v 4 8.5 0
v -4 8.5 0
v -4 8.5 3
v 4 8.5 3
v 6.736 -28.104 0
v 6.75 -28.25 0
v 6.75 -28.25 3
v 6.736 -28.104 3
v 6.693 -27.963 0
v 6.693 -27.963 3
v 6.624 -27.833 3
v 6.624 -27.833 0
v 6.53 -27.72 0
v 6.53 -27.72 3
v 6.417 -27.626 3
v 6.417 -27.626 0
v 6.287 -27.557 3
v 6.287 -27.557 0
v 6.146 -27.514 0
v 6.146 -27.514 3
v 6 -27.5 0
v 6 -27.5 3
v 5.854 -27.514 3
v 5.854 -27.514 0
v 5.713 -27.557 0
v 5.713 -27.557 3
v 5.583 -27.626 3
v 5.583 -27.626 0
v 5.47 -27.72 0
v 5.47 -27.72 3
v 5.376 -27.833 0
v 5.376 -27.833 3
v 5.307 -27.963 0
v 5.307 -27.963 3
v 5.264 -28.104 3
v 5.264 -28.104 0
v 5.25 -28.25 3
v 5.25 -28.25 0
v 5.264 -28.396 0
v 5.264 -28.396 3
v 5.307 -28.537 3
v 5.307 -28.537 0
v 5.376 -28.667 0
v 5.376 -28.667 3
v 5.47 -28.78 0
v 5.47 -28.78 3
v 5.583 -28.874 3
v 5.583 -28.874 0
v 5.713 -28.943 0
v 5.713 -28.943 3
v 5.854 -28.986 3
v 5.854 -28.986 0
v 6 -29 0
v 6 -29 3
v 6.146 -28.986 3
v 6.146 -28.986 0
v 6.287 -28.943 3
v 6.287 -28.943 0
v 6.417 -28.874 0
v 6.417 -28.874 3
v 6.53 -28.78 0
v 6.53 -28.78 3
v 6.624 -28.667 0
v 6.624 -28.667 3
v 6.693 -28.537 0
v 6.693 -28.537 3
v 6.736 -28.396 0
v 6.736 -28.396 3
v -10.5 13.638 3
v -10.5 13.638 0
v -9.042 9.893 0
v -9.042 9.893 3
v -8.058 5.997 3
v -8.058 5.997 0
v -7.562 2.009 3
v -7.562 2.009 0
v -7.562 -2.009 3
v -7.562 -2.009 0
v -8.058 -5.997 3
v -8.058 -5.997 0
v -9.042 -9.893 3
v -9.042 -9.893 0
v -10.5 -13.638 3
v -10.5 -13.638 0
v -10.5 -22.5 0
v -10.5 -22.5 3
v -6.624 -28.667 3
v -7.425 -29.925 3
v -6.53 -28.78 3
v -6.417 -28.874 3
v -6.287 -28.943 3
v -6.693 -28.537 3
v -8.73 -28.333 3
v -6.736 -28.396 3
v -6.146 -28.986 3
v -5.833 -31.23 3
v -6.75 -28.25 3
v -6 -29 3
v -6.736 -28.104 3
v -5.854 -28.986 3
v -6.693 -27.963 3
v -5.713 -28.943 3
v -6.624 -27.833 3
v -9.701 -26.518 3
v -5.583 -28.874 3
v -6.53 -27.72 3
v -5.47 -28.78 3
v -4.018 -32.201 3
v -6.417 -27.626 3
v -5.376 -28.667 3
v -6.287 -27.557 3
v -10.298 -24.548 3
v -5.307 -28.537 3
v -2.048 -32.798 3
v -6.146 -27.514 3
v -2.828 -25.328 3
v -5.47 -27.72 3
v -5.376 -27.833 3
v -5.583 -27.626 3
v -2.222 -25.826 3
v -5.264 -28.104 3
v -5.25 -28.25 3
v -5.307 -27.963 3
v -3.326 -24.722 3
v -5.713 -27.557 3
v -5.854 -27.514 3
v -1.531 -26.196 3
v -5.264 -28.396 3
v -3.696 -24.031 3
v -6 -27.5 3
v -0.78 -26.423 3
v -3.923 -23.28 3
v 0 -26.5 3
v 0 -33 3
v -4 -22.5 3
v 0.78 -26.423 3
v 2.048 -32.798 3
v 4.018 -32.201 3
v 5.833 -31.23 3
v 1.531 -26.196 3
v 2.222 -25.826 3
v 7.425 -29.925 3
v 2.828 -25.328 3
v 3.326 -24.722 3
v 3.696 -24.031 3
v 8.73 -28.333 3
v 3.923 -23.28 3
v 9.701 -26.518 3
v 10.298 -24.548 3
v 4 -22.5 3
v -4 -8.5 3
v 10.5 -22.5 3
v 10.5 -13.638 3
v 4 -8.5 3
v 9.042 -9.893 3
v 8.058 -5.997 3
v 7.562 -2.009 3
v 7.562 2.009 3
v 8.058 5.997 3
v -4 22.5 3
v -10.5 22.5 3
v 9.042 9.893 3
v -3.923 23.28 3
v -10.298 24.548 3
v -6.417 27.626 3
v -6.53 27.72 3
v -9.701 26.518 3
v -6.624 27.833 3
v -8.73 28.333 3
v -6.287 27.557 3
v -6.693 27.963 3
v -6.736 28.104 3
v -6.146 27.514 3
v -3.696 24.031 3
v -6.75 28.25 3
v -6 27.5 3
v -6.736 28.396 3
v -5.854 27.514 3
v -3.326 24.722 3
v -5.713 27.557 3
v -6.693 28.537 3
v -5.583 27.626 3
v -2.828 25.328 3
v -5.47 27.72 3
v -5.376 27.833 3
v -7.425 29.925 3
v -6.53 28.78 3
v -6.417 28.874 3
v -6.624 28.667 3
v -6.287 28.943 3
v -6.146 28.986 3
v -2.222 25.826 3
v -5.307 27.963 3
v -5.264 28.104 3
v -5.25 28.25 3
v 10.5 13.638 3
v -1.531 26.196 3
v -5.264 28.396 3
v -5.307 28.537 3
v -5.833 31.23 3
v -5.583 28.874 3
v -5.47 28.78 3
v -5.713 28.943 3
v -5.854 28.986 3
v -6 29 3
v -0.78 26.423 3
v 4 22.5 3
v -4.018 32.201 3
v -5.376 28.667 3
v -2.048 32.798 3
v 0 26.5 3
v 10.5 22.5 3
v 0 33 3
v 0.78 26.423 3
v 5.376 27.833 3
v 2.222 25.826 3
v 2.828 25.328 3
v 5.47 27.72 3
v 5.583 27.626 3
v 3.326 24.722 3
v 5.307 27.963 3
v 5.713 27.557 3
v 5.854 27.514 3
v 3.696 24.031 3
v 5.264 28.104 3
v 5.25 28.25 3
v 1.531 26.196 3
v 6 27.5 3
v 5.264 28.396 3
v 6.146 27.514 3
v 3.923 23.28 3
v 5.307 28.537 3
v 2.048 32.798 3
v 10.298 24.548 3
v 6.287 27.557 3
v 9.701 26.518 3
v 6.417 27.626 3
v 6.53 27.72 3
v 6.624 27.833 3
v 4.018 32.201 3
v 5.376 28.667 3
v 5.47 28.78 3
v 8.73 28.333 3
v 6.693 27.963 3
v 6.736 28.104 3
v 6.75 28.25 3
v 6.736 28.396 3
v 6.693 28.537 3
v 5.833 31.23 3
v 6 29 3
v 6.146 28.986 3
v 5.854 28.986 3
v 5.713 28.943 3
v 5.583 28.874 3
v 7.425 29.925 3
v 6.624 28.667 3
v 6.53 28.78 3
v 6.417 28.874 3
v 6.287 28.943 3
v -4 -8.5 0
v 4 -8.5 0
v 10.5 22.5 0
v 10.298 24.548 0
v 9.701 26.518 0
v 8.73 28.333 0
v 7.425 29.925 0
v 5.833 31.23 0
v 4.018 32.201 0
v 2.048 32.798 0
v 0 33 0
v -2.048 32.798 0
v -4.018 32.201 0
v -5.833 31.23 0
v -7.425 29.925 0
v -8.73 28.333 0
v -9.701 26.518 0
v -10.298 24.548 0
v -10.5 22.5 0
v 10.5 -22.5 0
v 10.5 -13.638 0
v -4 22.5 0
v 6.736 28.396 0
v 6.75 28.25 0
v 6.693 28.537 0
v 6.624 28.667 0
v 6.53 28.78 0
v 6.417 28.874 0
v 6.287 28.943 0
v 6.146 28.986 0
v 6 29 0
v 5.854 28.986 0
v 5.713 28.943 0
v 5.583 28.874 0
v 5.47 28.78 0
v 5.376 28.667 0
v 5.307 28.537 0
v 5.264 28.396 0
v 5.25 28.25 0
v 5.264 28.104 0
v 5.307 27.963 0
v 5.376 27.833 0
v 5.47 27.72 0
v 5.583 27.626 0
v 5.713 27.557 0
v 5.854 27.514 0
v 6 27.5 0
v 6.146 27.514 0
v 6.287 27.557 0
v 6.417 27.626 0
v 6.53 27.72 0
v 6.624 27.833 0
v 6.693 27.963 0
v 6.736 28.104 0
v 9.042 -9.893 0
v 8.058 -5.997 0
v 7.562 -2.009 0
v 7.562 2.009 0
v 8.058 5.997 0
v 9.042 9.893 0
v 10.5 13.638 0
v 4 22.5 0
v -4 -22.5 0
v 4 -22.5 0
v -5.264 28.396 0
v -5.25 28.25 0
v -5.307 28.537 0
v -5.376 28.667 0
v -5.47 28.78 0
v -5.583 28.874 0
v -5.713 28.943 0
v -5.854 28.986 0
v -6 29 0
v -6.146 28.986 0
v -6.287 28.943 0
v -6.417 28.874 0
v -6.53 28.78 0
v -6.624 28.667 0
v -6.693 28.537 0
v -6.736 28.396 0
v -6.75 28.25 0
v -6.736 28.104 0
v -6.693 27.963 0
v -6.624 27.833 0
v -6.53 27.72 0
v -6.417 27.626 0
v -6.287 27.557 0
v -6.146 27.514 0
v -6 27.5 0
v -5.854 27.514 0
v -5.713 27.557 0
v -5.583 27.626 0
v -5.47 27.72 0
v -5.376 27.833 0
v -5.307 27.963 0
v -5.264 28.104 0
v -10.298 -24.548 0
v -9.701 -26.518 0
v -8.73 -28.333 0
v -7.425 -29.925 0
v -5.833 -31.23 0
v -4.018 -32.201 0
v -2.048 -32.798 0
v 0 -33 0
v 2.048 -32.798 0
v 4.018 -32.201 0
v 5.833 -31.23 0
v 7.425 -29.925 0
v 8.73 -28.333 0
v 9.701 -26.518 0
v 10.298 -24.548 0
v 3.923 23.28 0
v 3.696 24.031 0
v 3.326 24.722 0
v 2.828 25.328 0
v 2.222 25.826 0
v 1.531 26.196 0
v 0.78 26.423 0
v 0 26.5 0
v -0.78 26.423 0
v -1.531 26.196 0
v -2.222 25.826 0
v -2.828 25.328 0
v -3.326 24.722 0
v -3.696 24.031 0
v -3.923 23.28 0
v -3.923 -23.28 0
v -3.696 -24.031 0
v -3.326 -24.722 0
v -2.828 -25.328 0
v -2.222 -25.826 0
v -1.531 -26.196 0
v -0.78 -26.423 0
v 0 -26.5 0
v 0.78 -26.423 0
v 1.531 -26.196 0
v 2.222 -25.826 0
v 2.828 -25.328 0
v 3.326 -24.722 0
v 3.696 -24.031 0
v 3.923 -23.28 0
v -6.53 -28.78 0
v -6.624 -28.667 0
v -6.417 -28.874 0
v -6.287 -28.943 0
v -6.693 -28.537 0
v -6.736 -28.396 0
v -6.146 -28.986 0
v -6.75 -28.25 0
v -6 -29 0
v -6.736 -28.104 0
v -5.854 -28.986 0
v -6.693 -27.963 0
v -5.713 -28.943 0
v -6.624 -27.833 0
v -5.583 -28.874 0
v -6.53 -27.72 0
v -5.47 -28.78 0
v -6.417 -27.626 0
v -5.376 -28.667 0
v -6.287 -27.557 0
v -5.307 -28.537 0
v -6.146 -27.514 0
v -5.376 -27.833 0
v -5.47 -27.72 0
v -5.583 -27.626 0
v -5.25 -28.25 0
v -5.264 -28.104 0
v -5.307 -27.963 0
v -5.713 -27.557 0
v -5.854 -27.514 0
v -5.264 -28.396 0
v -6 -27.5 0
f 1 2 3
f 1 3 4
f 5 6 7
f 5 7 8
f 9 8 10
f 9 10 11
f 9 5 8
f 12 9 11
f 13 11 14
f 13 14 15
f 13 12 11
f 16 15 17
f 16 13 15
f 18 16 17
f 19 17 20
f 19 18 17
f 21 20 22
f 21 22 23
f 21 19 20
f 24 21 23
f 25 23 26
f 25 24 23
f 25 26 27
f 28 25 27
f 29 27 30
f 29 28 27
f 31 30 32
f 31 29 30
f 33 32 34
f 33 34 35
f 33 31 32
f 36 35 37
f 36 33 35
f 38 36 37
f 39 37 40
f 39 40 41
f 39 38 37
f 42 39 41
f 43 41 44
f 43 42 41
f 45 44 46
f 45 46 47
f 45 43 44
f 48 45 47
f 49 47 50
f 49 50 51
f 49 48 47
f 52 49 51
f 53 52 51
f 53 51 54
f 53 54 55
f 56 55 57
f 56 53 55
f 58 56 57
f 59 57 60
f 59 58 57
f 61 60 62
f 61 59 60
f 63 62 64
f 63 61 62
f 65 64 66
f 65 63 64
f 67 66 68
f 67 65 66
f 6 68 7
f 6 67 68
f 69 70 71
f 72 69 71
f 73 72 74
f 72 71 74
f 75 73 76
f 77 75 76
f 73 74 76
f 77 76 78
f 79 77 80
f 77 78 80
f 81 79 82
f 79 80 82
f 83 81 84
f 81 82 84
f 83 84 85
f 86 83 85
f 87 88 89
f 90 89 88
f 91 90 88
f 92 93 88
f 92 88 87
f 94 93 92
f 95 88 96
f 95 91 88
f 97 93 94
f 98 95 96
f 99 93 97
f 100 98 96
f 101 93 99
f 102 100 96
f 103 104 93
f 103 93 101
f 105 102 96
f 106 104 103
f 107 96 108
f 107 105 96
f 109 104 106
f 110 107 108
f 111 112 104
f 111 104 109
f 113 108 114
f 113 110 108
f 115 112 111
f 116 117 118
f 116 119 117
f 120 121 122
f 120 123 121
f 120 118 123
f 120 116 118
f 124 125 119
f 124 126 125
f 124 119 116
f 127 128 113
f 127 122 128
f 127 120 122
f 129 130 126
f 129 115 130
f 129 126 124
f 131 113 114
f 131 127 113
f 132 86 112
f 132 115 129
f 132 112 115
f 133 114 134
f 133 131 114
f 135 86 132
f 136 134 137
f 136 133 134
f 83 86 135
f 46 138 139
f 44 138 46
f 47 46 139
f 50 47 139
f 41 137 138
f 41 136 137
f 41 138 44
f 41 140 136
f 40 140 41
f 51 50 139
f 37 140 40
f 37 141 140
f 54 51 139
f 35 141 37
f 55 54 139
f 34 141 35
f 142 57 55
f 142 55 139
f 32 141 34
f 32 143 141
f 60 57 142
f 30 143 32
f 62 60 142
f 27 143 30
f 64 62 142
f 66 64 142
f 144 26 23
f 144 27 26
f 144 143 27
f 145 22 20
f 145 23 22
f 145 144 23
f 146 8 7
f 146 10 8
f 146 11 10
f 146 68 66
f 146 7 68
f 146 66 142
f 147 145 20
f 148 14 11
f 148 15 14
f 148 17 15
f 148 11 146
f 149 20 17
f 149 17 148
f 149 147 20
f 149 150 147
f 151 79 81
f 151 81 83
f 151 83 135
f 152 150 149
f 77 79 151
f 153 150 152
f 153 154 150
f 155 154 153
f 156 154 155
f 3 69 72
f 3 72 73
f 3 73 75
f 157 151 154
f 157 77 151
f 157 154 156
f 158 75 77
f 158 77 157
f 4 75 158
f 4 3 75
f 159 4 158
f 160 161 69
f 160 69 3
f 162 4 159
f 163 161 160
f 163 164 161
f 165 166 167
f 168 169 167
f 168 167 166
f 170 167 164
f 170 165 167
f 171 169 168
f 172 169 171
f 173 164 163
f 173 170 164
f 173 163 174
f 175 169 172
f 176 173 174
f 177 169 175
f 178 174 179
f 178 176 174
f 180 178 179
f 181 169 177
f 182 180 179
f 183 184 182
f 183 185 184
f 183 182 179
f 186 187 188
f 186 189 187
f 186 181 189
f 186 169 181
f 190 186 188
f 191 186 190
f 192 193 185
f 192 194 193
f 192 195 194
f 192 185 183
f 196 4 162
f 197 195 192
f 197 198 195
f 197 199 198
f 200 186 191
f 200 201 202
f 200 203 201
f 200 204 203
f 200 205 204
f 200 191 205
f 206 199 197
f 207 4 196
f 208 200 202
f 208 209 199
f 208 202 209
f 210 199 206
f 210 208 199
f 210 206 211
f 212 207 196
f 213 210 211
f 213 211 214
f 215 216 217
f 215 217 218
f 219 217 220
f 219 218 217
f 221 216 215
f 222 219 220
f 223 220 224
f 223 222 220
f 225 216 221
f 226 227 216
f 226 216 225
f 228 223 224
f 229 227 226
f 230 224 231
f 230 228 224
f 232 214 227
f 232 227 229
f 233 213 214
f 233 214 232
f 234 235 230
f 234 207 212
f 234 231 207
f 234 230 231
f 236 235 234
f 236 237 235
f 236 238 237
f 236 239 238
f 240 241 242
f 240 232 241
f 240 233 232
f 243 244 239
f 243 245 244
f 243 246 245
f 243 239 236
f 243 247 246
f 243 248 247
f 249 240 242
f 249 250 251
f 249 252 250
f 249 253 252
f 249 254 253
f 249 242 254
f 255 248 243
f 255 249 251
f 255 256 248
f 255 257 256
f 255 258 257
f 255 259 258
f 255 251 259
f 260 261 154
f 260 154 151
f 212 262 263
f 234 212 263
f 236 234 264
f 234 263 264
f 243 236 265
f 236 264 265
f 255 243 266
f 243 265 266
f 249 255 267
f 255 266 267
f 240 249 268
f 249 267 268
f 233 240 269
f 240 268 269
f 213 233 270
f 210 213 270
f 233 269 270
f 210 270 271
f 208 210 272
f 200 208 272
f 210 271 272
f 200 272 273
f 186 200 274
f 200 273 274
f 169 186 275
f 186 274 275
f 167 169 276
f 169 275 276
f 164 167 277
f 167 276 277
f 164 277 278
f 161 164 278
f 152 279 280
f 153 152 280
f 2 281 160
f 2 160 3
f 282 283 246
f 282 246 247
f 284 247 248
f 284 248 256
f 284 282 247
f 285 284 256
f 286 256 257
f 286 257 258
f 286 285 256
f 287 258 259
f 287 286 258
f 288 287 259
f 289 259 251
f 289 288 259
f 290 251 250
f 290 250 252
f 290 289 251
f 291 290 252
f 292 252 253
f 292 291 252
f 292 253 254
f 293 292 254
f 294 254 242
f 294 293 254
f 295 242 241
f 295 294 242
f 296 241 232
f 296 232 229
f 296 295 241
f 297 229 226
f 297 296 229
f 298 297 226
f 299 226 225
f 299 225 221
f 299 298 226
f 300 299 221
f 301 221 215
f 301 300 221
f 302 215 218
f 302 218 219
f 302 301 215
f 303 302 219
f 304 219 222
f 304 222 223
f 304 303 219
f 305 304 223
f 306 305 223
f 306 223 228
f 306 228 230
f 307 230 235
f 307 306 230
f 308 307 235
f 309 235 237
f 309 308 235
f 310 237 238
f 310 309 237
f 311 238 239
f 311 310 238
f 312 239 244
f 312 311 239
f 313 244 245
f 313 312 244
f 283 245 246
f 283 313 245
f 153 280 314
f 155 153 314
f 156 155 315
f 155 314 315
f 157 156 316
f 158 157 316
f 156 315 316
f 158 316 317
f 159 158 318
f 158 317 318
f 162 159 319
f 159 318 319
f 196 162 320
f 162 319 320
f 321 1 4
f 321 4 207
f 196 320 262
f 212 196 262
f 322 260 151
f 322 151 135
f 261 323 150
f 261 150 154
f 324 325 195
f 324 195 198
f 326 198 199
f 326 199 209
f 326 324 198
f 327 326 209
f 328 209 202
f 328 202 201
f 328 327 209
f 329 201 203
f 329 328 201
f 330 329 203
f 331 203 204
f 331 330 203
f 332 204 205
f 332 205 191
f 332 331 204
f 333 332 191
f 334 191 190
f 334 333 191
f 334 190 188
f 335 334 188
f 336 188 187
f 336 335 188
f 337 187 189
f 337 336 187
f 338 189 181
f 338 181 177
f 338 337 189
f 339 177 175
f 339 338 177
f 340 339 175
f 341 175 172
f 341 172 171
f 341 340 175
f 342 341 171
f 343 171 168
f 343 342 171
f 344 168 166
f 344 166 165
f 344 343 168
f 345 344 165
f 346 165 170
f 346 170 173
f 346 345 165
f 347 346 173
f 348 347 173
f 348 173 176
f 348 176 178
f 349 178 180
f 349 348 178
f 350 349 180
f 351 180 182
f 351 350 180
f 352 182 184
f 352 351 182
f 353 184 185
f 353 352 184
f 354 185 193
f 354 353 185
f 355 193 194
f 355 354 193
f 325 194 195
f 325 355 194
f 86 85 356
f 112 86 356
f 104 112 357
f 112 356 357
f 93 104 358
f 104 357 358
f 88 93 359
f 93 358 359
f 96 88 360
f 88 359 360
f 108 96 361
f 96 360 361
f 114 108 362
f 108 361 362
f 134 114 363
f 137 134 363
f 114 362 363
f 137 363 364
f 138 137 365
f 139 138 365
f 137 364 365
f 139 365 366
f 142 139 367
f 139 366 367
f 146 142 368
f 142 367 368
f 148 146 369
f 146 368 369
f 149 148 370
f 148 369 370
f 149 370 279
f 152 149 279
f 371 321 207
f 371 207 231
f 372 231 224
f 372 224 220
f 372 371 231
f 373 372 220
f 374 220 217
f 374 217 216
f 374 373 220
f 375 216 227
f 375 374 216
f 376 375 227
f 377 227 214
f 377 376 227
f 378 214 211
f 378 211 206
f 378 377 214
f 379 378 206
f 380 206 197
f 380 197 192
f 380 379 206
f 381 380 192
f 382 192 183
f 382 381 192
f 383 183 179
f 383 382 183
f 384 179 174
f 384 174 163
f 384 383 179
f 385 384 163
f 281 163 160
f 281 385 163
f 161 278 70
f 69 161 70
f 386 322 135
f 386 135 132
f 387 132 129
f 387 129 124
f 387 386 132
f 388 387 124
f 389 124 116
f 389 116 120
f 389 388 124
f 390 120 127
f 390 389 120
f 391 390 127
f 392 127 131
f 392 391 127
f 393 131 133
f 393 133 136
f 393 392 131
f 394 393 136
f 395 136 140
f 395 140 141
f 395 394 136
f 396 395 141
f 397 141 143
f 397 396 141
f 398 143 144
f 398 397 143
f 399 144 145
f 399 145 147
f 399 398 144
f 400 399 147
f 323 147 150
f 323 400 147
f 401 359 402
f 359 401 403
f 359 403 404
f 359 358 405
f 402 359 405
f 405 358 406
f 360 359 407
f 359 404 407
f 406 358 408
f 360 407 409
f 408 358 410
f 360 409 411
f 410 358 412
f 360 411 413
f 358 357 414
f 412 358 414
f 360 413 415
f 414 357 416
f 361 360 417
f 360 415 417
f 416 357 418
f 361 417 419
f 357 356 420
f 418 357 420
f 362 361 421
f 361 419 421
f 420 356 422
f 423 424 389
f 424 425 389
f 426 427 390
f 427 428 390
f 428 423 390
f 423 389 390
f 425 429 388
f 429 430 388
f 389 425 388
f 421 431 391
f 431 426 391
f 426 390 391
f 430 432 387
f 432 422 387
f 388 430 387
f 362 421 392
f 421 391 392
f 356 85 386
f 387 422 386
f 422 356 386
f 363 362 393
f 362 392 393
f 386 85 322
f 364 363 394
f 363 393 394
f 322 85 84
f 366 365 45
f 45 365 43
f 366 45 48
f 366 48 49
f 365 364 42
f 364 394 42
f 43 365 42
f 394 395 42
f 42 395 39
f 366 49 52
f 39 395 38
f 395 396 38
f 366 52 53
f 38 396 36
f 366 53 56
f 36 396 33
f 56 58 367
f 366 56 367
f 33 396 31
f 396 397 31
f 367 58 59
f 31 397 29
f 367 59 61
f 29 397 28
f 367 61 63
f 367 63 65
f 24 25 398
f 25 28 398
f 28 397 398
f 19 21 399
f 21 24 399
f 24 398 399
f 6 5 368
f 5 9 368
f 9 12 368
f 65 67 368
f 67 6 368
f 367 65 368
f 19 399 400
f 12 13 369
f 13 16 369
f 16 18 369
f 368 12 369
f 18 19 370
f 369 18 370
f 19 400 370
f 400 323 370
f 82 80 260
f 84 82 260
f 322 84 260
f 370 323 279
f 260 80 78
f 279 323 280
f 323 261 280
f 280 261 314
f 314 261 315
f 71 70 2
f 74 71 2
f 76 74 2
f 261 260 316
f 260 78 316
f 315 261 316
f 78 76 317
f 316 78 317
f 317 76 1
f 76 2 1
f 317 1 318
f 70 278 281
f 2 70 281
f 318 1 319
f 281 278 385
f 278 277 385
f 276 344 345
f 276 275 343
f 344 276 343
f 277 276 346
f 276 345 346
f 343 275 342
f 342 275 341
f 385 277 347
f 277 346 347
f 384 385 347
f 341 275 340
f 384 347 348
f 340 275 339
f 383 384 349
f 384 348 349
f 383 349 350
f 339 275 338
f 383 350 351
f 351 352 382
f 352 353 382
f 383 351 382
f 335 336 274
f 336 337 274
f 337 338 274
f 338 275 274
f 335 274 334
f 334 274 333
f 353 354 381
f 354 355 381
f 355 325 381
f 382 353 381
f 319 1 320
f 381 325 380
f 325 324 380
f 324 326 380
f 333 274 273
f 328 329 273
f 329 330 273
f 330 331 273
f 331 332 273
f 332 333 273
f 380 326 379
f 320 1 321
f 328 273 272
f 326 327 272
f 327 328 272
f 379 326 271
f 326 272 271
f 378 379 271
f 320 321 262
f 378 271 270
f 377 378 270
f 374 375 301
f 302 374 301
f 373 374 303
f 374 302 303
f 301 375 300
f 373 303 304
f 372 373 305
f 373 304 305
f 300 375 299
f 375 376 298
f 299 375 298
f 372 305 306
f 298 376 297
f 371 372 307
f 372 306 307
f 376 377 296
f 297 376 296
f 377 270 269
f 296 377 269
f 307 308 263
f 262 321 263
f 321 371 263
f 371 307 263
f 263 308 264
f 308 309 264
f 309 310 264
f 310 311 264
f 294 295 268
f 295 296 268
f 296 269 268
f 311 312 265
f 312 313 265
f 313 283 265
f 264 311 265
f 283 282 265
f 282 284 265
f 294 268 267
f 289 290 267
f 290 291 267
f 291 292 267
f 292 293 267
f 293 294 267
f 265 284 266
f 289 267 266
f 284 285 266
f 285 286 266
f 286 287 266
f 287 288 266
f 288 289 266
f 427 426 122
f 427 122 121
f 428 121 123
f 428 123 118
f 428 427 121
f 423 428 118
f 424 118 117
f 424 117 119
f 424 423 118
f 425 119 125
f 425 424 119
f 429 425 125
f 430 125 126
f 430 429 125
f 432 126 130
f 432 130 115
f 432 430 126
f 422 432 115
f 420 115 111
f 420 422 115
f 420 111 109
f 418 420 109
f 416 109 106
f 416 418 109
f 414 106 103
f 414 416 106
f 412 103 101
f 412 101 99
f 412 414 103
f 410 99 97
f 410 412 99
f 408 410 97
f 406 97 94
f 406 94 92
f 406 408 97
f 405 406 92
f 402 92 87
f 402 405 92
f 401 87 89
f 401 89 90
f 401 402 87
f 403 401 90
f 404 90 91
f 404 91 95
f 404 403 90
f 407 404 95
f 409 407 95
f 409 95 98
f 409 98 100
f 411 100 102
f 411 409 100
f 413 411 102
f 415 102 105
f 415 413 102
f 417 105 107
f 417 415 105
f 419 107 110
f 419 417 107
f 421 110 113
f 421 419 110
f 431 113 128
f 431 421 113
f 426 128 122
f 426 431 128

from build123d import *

# Parameters (mm, degrees)
SKETCH_1_R      = 0.75
EXTRUDE_1_DEPTH = 3


with BuildPart() as part:
    # 草图1 → 凸台-拉伸1 (new body)
    with BuildSketch(Plane.XY):
        with BuildLine():
            Line((-10.5, 22.5), (-10.5, 13.638181697))
            ThreePointArc((-10.5, 13.638181697), (-7.5, 0), (-10.5, -13.638181697))
            Line((-10.5, -13.638181697), (-10.5, -22.5))
            ThreePointArc((-10.5, -22.5), (0, -33), (10.5, -22.5))
            Line((10.5, -22.5), (10.5, -13.638181697))
            ThreePointArc((10.5, -13.638181697), (7.5, 0), (10.5, 13.638181697))
            Line((10.5, 13.638181697), (10.5, 22.5))
            ThreePointArc((10.5, 22.5), (0, 33), (-10.5, 22.5))
        make_face()
        with Locations((6, 28.25)):
            Circle(SKETCH_1_R, mode=Mode.SUBTRACT)
        with Locations((-6, 28.25)):
            Circle(SKETCH_1_R, mode=Mode.SUBTRACT)
        with Locations((6, -28.25)):
            Circle(SKETCH_1_R, mode=Mode.SUBTRACT)
        with Locations((-6, -28.25)):
            Circle(SKETCH_1_R, mode=Mode.SUBTRACT)
        with BuildLine():
            ThreePointArc((4, 22.500000371), (-3.71e-07, 26.5), (-4, 22.499999629))
            Line((-4, 22.499999629), (-4, 8.5))
            Line((-4, 8.5), (4, 8.5))
            Line((4, 8.5), (4, 22.500000371))
        make_face(mode=Mode.SUBTRACT)
        with BuildLine():
            Line((4, -22.500000371), (4, -8.5))
            Line((4, -8.5), (-4, -8.5))
            Line((-4, -8.5), (-4, -22.499999629))
            ThreePointArc((-4, -22.499999629), (-3.71e-07, -26.5), (4, -22.500000371))
        make_face(mode=Mode.SUBTRACT)
    extrude(amount=EXTRUDE_1_DEPTH)


solid = part.part
